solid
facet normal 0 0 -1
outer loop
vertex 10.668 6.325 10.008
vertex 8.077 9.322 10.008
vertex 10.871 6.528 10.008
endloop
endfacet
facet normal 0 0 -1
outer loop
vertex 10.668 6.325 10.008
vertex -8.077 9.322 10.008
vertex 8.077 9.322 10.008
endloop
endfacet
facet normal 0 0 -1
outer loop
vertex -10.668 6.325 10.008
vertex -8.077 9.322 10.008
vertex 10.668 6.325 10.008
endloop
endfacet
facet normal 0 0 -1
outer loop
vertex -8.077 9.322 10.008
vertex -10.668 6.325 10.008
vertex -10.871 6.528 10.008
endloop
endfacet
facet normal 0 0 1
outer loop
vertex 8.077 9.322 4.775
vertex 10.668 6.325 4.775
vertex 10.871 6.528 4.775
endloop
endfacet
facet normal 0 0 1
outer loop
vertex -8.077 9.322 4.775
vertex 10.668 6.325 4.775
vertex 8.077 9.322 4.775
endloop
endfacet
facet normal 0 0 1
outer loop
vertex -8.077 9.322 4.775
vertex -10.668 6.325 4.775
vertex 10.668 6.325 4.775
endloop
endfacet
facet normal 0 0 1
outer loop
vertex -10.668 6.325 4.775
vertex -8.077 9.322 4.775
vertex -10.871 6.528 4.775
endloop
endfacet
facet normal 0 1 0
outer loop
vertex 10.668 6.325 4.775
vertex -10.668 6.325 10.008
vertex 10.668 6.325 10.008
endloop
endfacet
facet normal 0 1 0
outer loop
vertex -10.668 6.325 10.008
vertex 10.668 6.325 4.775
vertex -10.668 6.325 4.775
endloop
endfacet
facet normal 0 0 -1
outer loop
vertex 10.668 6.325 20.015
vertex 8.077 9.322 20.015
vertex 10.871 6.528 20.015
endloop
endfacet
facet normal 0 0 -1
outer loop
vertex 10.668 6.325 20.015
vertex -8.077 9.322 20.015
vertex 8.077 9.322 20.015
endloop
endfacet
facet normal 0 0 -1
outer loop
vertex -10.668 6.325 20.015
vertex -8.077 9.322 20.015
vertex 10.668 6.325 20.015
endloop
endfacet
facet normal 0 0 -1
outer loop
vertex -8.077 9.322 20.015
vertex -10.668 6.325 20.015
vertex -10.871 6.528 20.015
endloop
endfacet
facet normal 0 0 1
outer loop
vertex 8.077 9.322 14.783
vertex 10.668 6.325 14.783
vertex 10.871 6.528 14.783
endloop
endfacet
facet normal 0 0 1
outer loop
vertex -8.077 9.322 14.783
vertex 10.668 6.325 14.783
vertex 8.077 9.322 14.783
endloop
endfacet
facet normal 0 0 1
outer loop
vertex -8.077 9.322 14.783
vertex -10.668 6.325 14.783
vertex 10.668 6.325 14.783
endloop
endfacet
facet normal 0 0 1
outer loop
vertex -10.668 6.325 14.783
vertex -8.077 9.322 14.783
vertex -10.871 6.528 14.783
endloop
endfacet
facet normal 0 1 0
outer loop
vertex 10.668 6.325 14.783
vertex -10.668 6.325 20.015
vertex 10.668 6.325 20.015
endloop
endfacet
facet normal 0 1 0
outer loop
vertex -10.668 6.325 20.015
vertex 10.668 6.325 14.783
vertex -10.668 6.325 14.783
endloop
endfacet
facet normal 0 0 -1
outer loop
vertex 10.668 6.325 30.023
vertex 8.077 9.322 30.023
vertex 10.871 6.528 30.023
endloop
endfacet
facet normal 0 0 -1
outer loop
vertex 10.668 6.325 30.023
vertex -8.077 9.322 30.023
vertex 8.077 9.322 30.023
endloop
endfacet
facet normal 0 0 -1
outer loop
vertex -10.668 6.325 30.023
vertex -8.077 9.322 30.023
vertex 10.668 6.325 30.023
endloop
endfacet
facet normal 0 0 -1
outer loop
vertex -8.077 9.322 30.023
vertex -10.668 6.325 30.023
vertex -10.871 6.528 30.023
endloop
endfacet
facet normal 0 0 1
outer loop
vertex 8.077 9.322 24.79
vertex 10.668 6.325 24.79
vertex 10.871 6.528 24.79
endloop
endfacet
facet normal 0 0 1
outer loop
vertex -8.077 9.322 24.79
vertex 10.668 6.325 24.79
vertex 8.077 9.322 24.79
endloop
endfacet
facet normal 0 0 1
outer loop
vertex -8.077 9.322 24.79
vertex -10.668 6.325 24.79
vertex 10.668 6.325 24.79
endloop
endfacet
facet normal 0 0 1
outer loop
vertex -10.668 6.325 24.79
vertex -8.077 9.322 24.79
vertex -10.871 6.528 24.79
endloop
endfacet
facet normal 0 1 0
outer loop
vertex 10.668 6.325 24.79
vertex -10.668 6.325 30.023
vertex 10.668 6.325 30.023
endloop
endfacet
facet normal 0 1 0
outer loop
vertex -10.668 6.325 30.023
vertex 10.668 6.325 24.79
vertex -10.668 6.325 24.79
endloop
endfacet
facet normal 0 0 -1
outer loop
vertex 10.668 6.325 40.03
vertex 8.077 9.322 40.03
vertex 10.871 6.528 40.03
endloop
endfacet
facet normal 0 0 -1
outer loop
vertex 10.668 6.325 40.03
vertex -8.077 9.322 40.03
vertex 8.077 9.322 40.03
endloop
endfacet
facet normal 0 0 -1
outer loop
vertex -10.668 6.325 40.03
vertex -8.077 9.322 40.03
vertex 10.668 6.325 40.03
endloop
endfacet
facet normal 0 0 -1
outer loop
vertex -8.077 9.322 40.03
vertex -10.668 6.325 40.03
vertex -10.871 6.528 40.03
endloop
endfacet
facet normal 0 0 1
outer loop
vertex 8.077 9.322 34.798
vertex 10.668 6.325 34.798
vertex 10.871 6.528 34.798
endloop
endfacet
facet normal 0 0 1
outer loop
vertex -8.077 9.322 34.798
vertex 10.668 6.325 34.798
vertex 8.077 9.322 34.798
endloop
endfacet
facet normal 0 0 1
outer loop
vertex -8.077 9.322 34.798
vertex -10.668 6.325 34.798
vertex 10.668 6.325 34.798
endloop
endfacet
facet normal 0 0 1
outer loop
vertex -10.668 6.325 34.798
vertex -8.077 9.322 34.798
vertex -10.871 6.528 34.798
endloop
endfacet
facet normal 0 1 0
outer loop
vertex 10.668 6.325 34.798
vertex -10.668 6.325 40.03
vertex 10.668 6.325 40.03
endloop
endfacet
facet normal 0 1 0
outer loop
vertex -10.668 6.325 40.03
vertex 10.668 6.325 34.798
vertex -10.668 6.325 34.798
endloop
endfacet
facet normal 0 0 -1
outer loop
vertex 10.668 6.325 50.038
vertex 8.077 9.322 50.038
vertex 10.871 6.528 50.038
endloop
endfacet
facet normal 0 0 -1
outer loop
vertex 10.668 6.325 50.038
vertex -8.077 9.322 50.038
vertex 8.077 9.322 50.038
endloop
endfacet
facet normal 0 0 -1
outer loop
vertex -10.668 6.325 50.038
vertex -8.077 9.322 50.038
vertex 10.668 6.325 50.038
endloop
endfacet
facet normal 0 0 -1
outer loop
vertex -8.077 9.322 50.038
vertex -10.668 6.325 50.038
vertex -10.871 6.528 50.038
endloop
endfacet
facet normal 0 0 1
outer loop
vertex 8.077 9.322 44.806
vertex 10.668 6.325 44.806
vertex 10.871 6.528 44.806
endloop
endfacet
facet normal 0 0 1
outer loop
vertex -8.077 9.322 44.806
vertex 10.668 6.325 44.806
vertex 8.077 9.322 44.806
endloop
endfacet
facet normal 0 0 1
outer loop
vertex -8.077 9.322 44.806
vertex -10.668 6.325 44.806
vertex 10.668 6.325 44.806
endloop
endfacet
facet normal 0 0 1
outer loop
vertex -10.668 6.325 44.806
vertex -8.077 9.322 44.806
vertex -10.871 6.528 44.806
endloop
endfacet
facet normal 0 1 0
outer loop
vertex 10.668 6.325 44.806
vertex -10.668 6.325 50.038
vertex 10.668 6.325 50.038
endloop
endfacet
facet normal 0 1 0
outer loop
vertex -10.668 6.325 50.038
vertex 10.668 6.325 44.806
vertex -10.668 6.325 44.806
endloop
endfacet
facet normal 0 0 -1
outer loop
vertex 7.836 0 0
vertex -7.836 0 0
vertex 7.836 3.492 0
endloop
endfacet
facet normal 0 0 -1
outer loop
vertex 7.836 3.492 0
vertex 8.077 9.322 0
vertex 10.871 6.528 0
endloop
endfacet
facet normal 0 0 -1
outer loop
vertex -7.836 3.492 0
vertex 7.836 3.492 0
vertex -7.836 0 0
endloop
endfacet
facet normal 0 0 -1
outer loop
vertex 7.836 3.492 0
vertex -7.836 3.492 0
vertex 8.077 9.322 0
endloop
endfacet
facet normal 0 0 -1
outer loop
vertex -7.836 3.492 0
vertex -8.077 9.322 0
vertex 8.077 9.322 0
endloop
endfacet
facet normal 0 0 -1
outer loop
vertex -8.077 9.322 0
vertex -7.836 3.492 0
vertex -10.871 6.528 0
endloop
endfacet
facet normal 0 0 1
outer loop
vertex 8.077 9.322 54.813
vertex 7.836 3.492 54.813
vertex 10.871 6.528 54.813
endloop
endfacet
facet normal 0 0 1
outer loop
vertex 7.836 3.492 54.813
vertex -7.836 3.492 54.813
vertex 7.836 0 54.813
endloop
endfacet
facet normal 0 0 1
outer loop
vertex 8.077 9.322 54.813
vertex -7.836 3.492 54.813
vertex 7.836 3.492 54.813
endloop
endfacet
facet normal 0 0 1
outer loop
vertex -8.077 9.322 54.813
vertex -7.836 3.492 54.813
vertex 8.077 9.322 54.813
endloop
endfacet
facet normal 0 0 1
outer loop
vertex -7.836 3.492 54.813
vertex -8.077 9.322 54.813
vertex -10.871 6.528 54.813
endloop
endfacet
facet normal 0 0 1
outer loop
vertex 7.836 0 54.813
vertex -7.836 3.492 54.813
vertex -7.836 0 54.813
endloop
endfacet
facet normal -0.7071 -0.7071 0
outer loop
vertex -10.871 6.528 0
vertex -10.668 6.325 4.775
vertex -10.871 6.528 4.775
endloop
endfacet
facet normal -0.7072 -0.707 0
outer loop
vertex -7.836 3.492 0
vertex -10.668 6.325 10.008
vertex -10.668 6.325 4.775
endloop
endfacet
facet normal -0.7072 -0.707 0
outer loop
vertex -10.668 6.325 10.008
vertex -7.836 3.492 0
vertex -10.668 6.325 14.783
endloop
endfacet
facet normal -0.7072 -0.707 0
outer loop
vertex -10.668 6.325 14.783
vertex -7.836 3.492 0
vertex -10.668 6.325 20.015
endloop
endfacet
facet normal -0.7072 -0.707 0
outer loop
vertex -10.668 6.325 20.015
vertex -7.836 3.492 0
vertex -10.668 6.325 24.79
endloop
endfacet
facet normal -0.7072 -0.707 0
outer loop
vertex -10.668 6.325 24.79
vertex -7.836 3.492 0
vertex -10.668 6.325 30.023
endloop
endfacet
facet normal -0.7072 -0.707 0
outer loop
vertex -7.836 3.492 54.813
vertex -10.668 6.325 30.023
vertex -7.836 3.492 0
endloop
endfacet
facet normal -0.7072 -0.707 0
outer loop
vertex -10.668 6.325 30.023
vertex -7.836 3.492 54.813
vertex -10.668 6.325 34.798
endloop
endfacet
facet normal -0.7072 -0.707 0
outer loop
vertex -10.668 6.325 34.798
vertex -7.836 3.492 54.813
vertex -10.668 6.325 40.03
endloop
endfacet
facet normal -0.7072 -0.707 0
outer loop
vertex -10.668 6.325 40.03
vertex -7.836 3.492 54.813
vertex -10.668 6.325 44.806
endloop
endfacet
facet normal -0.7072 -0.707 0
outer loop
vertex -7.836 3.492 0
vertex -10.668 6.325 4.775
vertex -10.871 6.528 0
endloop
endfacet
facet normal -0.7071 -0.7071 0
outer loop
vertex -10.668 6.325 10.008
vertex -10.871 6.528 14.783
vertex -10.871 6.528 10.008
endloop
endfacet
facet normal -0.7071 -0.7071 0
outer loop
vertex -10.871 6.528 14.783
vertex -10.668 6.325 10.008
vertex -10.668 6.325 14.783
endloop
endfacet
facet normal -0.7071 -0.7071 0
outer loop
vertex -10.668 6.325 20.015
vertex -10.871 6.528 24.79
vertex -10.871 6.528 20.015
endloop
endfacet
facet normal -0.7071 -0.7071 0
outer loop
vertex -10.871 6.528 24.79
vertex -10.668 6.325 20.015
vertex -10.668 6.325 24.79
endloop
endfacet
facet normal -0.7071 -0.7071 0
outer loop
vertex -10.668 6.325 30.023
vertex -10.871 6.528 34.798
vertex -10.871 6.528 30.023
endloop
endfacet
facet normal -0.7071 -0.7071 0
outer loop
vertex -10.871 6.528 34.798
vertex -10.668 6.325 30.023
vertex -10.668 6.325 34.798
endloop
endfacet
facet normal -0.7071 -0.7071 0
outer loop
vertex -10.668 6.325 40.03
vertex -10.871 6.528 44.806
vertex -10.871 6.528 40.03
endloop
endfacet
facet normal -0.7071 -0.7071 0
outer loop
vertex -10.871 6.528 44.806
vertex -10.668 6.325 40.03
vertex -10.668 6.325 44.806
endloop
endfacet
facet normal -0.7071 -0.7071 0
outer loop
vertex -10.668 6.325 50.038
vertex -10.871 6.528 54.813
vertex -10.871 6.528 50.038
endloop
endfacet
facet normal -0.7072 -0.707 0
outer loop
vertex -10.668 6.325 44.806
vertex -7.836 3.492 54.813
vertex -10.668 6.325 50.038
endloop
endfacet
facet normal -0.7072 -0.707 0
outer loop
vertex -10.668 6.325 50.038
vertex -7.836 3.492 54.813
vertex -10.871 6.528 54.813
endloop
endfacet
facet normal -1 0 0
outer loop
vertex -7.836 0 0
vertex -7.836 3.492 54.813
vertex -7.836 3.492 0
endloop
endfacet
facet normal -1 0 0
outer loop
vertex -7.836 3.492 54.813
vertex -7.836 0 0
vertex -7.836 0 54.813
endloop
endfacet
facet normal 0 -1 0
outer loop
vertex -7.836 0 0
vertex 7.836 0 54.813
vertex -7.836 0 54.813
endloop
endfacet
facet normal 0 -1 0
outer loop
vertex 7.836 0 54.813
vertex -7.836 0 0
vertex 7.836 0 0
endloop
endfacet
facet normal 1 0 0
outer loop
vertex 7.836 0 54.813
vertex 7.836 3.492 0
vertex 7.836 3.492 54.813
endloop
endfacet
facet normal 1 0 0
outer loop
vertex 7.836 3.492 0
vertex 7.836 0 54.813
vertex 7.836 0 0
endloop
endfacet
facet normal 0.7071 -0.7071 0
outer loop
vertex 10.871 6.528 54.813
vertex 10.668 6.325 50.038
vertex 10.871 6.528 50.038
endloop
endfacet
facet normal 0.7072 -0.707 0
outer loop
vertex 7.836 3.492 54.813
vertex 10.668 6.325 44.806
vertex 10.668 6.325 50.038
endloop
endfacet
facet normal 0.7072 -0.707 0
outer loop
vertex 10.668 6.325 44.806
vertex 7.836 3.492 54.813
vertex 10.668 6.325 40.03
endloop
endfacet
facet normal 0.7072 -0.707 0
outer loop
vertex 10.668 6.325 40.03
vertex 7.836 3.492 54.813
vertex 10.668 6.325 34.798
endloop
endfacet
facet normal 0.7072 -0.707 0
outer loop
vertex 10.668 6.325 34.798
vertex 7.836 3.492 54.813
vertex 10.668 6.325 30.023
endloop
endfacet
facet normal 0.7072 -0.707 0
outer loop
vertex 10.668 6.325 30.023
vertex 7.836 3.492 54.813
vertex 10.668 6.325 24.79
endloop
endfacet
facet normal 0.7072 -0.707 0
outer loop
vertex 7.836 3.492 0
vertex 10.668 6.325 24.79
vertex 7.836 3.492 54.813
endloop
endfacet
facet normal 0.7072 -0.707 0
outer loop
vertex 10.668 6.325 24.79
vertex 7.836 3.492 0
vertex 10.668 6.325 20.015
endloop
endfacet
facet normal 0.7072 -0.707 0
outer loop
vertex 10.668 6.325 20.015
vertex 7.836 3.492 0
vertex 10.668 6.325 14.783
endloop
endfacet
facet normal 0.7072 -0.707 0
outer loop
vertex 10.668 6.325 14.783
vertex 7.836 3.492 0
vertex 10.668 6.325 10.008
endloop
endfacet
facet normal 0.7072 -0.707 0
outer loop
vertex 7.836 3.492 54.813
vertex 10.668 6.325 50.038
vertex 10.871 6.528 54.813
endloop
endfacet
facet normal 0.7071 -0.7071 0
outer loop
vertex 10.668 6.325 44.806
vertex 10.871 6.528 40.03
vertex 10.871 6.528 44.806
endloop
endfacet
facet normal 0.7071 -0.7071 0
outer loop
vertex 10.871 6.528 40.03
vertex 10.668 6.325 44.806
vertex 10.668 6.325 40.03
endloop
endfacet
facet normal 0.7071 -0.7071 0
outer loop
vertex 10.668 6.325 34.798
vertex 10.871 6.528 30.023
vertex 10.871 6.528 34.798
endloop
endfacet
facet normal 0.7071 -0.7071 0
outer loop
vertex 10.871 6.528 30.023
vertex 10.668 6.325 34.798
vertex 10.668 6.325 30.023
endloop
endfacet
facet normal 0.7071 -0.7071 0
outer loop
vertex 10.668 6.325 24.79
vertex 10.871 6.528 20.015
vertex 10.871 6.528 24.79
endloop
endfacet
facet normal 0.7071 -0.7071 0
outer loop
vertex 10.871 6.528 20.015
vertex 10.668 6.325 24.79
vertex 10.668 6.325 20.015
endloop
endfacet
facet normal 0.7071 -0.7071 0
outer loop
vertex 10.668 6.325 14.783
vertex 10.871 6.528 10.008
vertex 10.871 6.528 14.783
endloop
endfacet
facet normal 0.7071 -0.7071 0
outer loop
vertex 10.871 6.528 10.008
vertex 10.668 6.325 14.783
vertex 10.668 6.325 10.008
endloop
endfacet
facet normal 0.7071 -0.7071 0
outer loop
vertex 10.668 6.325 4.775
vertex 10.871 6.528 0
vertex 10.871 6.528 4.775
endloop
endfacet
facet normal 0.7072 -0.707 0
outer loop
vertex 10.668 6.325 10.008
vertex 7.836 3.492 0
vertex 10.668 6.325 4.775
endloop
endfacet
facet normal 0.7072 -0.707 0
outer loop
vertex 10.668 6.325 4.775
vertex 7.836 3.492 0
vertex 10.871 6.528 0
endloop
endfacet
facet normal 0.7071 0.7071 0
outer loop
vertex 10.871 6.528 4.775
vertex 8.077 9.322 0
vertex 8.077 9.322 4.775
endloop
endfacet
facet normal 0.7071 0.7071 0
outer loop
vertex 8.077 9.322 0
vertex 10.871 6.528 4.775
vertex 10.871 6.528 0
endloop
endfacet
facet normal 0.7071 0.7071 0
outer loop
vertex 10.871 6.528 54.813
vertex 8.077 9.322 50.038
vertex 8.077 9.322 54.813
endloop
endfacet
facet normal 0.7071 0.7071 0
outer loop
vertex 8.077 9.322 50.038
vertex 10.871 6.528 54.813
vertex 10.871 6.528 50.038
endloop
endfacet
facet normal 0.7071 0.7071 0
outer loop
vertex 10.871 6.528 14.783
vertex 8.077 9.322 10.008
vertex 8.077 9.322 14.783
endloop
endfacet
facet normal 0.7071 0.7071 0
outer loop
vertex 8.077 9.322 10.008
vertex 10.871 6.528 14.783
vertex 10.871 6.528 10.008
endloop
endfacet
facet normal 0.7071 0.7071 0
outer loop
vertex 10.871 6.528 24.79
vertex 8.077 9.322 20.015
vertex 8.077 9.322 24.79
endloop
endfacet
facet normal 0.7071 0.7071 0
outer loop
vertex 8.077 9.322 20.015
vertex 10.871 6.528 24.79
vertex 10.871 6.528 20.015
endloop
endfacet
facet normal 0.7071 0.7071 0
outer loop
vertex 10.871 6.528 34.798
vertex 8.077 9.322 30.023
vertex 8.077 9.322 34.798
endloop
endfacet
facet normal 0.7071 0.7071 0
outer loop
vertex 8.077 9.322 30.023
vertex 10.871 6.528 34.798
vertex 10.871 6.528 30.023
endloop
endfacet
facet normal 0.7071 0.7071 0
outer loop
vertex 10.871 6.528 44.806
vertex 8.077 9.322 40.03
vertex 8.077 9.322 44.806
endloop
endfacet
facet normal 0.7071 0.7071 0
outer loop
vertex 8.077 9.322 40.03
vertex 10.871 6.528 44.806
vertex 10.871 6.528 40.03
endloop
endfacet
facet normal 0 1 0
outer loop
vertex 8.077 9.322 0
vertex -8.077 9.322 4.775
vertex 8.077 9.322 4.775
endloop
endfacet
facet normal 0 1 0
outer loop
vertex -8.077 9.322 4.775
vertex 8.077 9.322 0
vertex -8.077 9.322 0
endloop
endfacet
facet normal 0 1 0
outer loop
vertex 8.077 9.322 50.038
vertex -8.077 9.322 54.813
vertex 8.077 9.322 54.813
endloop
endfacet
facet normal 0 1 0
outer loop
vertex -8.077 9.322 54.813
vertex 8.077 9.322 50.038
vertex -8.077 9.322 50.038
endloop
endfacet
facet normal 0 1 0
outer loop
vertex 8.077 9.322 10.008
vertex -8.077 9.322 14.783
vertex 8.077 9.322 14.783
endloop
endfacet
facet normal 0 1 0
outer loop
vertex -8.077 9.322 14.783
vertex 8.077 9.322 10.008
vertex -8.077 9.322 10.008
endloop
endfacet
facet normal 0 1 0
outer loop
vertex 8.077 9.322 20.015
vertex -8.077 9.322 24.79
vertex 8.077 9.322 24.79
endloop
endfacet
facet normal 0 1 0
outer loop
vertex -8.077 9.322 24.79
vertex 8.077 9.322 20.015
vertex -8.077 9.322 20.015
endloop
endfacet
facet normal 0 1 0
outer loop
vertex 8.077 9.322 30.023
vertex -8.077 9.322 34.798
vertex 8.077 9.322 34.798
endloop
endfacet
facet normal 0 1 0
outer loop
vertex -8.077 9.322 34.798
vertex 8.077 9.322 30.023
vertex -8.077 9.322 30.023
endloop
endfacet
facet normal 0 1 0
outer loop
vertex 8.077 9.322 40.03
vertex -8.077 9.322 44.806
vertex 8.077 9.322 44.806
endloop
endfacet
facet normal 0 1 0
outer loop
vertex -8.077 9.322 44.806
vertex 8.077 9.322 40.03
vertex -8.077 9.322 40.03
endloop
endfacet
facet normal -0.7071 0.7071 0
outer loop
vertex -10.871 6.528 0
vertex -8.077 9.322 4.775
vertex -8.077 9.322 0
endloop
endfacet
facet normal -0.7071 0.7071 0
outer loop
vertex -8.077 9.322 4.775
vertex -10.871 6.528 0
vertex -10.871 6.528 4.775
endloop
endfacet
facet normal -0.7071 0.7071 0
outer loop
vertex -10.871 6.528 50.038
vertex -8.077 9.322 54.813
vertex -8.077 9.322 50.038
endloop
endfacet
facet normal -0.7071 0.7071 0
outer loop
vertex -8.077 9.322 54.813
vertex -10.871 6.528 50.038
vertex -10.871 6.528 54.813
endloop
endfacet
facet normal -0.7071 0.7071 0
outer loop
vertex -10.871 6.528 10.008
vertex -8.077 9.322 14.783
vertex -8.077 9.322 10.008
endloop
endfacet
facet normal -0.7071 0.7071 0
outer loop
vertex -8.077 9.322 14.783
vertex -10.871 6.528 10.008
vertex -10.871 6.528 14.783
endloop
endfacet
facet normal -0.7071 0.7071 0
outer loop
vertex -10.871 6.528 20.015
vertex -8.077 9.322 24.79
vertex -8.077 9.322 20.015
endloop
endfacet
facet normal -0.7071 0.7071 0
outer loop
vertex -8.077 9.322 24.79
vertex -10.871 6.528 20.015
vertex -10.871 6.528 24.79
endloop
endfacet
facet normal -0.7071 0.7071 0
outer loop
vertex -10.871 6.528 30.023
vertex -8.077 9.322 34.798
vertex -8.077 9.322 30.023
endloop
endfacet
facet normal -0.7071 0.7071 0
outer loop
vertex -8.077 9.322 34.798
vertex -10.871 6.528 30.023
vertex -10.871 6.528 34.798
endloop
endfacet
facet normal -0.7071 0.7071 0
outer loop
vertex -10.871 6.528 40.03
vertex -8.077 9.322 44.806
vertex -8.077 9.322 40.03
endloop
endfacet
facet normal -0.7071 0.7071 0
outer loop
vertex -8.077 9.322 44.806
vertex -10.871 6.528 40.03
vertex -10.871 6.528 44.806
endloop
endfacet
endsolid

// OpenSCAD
// file: conversions.scad
function inch_to_mm(val) = val * 25.4;
function mm_to_inch(val) = val / 25.4;
// main file
use <conversions.scad>;


total_height = inch_to_mm(.367);

module mil_std_1913(segments) {
  period = inch_to_mm(.394);
  groove_width = inch_to_mm(.206); // +.008
  groove_depth = inch_to_mm(.118); // +.008
  land_width = period - groove_width;

  width = land_width + segments * (groove_width + land_width);

  difference() {
    linear_extrude(width) {
      mil_std_1913_profile();
    }
    for (i = [0:segments - 1 ]) {
      translate([-20,total_height - groove_depth,land_width + (i * period)]) {
        cube([40, groove_depth + 1, groove_width]);
      }
    }
  }
}

module mil_std_1913_profile() {
  total_width = inch_to_mm(.835);
  // base
  base_width = inch_to_mm(.617);
  // top
  // square([inch_to_mm(.835), 1]);
  // top central section
  central_section_width = inch_to_mm(.748);
  central_section_height = inch_to_mm(.108);
  union() {
    translate([-base_width / 2, 0]) {
      square([base_width, total_height]);
    };
    difference() {
      translate([-central_section_width / 2, total_height - inch_to_mm(.164)]) {
        hull() {
          // left angle
          translate([-central_section_height / 2, central_section_height / 2]) {
            rotate([0,0,-45]) {
              square([central_section_height * 2, central_section_height * 2]);
            }
          }
          // right angle
          translate([central_section_width + central_section_height / 2, central_section_height / 2]) {
            rotate([0,0,135]) {
              square([central_section_height * 2, central_section_height * 2]);
            }
          }
        }
      }
      translate([-total_width, total_height]) {
        square([total_width * 2, total_height]);
      };
    }
  }
}

mil_std_1913(5);
